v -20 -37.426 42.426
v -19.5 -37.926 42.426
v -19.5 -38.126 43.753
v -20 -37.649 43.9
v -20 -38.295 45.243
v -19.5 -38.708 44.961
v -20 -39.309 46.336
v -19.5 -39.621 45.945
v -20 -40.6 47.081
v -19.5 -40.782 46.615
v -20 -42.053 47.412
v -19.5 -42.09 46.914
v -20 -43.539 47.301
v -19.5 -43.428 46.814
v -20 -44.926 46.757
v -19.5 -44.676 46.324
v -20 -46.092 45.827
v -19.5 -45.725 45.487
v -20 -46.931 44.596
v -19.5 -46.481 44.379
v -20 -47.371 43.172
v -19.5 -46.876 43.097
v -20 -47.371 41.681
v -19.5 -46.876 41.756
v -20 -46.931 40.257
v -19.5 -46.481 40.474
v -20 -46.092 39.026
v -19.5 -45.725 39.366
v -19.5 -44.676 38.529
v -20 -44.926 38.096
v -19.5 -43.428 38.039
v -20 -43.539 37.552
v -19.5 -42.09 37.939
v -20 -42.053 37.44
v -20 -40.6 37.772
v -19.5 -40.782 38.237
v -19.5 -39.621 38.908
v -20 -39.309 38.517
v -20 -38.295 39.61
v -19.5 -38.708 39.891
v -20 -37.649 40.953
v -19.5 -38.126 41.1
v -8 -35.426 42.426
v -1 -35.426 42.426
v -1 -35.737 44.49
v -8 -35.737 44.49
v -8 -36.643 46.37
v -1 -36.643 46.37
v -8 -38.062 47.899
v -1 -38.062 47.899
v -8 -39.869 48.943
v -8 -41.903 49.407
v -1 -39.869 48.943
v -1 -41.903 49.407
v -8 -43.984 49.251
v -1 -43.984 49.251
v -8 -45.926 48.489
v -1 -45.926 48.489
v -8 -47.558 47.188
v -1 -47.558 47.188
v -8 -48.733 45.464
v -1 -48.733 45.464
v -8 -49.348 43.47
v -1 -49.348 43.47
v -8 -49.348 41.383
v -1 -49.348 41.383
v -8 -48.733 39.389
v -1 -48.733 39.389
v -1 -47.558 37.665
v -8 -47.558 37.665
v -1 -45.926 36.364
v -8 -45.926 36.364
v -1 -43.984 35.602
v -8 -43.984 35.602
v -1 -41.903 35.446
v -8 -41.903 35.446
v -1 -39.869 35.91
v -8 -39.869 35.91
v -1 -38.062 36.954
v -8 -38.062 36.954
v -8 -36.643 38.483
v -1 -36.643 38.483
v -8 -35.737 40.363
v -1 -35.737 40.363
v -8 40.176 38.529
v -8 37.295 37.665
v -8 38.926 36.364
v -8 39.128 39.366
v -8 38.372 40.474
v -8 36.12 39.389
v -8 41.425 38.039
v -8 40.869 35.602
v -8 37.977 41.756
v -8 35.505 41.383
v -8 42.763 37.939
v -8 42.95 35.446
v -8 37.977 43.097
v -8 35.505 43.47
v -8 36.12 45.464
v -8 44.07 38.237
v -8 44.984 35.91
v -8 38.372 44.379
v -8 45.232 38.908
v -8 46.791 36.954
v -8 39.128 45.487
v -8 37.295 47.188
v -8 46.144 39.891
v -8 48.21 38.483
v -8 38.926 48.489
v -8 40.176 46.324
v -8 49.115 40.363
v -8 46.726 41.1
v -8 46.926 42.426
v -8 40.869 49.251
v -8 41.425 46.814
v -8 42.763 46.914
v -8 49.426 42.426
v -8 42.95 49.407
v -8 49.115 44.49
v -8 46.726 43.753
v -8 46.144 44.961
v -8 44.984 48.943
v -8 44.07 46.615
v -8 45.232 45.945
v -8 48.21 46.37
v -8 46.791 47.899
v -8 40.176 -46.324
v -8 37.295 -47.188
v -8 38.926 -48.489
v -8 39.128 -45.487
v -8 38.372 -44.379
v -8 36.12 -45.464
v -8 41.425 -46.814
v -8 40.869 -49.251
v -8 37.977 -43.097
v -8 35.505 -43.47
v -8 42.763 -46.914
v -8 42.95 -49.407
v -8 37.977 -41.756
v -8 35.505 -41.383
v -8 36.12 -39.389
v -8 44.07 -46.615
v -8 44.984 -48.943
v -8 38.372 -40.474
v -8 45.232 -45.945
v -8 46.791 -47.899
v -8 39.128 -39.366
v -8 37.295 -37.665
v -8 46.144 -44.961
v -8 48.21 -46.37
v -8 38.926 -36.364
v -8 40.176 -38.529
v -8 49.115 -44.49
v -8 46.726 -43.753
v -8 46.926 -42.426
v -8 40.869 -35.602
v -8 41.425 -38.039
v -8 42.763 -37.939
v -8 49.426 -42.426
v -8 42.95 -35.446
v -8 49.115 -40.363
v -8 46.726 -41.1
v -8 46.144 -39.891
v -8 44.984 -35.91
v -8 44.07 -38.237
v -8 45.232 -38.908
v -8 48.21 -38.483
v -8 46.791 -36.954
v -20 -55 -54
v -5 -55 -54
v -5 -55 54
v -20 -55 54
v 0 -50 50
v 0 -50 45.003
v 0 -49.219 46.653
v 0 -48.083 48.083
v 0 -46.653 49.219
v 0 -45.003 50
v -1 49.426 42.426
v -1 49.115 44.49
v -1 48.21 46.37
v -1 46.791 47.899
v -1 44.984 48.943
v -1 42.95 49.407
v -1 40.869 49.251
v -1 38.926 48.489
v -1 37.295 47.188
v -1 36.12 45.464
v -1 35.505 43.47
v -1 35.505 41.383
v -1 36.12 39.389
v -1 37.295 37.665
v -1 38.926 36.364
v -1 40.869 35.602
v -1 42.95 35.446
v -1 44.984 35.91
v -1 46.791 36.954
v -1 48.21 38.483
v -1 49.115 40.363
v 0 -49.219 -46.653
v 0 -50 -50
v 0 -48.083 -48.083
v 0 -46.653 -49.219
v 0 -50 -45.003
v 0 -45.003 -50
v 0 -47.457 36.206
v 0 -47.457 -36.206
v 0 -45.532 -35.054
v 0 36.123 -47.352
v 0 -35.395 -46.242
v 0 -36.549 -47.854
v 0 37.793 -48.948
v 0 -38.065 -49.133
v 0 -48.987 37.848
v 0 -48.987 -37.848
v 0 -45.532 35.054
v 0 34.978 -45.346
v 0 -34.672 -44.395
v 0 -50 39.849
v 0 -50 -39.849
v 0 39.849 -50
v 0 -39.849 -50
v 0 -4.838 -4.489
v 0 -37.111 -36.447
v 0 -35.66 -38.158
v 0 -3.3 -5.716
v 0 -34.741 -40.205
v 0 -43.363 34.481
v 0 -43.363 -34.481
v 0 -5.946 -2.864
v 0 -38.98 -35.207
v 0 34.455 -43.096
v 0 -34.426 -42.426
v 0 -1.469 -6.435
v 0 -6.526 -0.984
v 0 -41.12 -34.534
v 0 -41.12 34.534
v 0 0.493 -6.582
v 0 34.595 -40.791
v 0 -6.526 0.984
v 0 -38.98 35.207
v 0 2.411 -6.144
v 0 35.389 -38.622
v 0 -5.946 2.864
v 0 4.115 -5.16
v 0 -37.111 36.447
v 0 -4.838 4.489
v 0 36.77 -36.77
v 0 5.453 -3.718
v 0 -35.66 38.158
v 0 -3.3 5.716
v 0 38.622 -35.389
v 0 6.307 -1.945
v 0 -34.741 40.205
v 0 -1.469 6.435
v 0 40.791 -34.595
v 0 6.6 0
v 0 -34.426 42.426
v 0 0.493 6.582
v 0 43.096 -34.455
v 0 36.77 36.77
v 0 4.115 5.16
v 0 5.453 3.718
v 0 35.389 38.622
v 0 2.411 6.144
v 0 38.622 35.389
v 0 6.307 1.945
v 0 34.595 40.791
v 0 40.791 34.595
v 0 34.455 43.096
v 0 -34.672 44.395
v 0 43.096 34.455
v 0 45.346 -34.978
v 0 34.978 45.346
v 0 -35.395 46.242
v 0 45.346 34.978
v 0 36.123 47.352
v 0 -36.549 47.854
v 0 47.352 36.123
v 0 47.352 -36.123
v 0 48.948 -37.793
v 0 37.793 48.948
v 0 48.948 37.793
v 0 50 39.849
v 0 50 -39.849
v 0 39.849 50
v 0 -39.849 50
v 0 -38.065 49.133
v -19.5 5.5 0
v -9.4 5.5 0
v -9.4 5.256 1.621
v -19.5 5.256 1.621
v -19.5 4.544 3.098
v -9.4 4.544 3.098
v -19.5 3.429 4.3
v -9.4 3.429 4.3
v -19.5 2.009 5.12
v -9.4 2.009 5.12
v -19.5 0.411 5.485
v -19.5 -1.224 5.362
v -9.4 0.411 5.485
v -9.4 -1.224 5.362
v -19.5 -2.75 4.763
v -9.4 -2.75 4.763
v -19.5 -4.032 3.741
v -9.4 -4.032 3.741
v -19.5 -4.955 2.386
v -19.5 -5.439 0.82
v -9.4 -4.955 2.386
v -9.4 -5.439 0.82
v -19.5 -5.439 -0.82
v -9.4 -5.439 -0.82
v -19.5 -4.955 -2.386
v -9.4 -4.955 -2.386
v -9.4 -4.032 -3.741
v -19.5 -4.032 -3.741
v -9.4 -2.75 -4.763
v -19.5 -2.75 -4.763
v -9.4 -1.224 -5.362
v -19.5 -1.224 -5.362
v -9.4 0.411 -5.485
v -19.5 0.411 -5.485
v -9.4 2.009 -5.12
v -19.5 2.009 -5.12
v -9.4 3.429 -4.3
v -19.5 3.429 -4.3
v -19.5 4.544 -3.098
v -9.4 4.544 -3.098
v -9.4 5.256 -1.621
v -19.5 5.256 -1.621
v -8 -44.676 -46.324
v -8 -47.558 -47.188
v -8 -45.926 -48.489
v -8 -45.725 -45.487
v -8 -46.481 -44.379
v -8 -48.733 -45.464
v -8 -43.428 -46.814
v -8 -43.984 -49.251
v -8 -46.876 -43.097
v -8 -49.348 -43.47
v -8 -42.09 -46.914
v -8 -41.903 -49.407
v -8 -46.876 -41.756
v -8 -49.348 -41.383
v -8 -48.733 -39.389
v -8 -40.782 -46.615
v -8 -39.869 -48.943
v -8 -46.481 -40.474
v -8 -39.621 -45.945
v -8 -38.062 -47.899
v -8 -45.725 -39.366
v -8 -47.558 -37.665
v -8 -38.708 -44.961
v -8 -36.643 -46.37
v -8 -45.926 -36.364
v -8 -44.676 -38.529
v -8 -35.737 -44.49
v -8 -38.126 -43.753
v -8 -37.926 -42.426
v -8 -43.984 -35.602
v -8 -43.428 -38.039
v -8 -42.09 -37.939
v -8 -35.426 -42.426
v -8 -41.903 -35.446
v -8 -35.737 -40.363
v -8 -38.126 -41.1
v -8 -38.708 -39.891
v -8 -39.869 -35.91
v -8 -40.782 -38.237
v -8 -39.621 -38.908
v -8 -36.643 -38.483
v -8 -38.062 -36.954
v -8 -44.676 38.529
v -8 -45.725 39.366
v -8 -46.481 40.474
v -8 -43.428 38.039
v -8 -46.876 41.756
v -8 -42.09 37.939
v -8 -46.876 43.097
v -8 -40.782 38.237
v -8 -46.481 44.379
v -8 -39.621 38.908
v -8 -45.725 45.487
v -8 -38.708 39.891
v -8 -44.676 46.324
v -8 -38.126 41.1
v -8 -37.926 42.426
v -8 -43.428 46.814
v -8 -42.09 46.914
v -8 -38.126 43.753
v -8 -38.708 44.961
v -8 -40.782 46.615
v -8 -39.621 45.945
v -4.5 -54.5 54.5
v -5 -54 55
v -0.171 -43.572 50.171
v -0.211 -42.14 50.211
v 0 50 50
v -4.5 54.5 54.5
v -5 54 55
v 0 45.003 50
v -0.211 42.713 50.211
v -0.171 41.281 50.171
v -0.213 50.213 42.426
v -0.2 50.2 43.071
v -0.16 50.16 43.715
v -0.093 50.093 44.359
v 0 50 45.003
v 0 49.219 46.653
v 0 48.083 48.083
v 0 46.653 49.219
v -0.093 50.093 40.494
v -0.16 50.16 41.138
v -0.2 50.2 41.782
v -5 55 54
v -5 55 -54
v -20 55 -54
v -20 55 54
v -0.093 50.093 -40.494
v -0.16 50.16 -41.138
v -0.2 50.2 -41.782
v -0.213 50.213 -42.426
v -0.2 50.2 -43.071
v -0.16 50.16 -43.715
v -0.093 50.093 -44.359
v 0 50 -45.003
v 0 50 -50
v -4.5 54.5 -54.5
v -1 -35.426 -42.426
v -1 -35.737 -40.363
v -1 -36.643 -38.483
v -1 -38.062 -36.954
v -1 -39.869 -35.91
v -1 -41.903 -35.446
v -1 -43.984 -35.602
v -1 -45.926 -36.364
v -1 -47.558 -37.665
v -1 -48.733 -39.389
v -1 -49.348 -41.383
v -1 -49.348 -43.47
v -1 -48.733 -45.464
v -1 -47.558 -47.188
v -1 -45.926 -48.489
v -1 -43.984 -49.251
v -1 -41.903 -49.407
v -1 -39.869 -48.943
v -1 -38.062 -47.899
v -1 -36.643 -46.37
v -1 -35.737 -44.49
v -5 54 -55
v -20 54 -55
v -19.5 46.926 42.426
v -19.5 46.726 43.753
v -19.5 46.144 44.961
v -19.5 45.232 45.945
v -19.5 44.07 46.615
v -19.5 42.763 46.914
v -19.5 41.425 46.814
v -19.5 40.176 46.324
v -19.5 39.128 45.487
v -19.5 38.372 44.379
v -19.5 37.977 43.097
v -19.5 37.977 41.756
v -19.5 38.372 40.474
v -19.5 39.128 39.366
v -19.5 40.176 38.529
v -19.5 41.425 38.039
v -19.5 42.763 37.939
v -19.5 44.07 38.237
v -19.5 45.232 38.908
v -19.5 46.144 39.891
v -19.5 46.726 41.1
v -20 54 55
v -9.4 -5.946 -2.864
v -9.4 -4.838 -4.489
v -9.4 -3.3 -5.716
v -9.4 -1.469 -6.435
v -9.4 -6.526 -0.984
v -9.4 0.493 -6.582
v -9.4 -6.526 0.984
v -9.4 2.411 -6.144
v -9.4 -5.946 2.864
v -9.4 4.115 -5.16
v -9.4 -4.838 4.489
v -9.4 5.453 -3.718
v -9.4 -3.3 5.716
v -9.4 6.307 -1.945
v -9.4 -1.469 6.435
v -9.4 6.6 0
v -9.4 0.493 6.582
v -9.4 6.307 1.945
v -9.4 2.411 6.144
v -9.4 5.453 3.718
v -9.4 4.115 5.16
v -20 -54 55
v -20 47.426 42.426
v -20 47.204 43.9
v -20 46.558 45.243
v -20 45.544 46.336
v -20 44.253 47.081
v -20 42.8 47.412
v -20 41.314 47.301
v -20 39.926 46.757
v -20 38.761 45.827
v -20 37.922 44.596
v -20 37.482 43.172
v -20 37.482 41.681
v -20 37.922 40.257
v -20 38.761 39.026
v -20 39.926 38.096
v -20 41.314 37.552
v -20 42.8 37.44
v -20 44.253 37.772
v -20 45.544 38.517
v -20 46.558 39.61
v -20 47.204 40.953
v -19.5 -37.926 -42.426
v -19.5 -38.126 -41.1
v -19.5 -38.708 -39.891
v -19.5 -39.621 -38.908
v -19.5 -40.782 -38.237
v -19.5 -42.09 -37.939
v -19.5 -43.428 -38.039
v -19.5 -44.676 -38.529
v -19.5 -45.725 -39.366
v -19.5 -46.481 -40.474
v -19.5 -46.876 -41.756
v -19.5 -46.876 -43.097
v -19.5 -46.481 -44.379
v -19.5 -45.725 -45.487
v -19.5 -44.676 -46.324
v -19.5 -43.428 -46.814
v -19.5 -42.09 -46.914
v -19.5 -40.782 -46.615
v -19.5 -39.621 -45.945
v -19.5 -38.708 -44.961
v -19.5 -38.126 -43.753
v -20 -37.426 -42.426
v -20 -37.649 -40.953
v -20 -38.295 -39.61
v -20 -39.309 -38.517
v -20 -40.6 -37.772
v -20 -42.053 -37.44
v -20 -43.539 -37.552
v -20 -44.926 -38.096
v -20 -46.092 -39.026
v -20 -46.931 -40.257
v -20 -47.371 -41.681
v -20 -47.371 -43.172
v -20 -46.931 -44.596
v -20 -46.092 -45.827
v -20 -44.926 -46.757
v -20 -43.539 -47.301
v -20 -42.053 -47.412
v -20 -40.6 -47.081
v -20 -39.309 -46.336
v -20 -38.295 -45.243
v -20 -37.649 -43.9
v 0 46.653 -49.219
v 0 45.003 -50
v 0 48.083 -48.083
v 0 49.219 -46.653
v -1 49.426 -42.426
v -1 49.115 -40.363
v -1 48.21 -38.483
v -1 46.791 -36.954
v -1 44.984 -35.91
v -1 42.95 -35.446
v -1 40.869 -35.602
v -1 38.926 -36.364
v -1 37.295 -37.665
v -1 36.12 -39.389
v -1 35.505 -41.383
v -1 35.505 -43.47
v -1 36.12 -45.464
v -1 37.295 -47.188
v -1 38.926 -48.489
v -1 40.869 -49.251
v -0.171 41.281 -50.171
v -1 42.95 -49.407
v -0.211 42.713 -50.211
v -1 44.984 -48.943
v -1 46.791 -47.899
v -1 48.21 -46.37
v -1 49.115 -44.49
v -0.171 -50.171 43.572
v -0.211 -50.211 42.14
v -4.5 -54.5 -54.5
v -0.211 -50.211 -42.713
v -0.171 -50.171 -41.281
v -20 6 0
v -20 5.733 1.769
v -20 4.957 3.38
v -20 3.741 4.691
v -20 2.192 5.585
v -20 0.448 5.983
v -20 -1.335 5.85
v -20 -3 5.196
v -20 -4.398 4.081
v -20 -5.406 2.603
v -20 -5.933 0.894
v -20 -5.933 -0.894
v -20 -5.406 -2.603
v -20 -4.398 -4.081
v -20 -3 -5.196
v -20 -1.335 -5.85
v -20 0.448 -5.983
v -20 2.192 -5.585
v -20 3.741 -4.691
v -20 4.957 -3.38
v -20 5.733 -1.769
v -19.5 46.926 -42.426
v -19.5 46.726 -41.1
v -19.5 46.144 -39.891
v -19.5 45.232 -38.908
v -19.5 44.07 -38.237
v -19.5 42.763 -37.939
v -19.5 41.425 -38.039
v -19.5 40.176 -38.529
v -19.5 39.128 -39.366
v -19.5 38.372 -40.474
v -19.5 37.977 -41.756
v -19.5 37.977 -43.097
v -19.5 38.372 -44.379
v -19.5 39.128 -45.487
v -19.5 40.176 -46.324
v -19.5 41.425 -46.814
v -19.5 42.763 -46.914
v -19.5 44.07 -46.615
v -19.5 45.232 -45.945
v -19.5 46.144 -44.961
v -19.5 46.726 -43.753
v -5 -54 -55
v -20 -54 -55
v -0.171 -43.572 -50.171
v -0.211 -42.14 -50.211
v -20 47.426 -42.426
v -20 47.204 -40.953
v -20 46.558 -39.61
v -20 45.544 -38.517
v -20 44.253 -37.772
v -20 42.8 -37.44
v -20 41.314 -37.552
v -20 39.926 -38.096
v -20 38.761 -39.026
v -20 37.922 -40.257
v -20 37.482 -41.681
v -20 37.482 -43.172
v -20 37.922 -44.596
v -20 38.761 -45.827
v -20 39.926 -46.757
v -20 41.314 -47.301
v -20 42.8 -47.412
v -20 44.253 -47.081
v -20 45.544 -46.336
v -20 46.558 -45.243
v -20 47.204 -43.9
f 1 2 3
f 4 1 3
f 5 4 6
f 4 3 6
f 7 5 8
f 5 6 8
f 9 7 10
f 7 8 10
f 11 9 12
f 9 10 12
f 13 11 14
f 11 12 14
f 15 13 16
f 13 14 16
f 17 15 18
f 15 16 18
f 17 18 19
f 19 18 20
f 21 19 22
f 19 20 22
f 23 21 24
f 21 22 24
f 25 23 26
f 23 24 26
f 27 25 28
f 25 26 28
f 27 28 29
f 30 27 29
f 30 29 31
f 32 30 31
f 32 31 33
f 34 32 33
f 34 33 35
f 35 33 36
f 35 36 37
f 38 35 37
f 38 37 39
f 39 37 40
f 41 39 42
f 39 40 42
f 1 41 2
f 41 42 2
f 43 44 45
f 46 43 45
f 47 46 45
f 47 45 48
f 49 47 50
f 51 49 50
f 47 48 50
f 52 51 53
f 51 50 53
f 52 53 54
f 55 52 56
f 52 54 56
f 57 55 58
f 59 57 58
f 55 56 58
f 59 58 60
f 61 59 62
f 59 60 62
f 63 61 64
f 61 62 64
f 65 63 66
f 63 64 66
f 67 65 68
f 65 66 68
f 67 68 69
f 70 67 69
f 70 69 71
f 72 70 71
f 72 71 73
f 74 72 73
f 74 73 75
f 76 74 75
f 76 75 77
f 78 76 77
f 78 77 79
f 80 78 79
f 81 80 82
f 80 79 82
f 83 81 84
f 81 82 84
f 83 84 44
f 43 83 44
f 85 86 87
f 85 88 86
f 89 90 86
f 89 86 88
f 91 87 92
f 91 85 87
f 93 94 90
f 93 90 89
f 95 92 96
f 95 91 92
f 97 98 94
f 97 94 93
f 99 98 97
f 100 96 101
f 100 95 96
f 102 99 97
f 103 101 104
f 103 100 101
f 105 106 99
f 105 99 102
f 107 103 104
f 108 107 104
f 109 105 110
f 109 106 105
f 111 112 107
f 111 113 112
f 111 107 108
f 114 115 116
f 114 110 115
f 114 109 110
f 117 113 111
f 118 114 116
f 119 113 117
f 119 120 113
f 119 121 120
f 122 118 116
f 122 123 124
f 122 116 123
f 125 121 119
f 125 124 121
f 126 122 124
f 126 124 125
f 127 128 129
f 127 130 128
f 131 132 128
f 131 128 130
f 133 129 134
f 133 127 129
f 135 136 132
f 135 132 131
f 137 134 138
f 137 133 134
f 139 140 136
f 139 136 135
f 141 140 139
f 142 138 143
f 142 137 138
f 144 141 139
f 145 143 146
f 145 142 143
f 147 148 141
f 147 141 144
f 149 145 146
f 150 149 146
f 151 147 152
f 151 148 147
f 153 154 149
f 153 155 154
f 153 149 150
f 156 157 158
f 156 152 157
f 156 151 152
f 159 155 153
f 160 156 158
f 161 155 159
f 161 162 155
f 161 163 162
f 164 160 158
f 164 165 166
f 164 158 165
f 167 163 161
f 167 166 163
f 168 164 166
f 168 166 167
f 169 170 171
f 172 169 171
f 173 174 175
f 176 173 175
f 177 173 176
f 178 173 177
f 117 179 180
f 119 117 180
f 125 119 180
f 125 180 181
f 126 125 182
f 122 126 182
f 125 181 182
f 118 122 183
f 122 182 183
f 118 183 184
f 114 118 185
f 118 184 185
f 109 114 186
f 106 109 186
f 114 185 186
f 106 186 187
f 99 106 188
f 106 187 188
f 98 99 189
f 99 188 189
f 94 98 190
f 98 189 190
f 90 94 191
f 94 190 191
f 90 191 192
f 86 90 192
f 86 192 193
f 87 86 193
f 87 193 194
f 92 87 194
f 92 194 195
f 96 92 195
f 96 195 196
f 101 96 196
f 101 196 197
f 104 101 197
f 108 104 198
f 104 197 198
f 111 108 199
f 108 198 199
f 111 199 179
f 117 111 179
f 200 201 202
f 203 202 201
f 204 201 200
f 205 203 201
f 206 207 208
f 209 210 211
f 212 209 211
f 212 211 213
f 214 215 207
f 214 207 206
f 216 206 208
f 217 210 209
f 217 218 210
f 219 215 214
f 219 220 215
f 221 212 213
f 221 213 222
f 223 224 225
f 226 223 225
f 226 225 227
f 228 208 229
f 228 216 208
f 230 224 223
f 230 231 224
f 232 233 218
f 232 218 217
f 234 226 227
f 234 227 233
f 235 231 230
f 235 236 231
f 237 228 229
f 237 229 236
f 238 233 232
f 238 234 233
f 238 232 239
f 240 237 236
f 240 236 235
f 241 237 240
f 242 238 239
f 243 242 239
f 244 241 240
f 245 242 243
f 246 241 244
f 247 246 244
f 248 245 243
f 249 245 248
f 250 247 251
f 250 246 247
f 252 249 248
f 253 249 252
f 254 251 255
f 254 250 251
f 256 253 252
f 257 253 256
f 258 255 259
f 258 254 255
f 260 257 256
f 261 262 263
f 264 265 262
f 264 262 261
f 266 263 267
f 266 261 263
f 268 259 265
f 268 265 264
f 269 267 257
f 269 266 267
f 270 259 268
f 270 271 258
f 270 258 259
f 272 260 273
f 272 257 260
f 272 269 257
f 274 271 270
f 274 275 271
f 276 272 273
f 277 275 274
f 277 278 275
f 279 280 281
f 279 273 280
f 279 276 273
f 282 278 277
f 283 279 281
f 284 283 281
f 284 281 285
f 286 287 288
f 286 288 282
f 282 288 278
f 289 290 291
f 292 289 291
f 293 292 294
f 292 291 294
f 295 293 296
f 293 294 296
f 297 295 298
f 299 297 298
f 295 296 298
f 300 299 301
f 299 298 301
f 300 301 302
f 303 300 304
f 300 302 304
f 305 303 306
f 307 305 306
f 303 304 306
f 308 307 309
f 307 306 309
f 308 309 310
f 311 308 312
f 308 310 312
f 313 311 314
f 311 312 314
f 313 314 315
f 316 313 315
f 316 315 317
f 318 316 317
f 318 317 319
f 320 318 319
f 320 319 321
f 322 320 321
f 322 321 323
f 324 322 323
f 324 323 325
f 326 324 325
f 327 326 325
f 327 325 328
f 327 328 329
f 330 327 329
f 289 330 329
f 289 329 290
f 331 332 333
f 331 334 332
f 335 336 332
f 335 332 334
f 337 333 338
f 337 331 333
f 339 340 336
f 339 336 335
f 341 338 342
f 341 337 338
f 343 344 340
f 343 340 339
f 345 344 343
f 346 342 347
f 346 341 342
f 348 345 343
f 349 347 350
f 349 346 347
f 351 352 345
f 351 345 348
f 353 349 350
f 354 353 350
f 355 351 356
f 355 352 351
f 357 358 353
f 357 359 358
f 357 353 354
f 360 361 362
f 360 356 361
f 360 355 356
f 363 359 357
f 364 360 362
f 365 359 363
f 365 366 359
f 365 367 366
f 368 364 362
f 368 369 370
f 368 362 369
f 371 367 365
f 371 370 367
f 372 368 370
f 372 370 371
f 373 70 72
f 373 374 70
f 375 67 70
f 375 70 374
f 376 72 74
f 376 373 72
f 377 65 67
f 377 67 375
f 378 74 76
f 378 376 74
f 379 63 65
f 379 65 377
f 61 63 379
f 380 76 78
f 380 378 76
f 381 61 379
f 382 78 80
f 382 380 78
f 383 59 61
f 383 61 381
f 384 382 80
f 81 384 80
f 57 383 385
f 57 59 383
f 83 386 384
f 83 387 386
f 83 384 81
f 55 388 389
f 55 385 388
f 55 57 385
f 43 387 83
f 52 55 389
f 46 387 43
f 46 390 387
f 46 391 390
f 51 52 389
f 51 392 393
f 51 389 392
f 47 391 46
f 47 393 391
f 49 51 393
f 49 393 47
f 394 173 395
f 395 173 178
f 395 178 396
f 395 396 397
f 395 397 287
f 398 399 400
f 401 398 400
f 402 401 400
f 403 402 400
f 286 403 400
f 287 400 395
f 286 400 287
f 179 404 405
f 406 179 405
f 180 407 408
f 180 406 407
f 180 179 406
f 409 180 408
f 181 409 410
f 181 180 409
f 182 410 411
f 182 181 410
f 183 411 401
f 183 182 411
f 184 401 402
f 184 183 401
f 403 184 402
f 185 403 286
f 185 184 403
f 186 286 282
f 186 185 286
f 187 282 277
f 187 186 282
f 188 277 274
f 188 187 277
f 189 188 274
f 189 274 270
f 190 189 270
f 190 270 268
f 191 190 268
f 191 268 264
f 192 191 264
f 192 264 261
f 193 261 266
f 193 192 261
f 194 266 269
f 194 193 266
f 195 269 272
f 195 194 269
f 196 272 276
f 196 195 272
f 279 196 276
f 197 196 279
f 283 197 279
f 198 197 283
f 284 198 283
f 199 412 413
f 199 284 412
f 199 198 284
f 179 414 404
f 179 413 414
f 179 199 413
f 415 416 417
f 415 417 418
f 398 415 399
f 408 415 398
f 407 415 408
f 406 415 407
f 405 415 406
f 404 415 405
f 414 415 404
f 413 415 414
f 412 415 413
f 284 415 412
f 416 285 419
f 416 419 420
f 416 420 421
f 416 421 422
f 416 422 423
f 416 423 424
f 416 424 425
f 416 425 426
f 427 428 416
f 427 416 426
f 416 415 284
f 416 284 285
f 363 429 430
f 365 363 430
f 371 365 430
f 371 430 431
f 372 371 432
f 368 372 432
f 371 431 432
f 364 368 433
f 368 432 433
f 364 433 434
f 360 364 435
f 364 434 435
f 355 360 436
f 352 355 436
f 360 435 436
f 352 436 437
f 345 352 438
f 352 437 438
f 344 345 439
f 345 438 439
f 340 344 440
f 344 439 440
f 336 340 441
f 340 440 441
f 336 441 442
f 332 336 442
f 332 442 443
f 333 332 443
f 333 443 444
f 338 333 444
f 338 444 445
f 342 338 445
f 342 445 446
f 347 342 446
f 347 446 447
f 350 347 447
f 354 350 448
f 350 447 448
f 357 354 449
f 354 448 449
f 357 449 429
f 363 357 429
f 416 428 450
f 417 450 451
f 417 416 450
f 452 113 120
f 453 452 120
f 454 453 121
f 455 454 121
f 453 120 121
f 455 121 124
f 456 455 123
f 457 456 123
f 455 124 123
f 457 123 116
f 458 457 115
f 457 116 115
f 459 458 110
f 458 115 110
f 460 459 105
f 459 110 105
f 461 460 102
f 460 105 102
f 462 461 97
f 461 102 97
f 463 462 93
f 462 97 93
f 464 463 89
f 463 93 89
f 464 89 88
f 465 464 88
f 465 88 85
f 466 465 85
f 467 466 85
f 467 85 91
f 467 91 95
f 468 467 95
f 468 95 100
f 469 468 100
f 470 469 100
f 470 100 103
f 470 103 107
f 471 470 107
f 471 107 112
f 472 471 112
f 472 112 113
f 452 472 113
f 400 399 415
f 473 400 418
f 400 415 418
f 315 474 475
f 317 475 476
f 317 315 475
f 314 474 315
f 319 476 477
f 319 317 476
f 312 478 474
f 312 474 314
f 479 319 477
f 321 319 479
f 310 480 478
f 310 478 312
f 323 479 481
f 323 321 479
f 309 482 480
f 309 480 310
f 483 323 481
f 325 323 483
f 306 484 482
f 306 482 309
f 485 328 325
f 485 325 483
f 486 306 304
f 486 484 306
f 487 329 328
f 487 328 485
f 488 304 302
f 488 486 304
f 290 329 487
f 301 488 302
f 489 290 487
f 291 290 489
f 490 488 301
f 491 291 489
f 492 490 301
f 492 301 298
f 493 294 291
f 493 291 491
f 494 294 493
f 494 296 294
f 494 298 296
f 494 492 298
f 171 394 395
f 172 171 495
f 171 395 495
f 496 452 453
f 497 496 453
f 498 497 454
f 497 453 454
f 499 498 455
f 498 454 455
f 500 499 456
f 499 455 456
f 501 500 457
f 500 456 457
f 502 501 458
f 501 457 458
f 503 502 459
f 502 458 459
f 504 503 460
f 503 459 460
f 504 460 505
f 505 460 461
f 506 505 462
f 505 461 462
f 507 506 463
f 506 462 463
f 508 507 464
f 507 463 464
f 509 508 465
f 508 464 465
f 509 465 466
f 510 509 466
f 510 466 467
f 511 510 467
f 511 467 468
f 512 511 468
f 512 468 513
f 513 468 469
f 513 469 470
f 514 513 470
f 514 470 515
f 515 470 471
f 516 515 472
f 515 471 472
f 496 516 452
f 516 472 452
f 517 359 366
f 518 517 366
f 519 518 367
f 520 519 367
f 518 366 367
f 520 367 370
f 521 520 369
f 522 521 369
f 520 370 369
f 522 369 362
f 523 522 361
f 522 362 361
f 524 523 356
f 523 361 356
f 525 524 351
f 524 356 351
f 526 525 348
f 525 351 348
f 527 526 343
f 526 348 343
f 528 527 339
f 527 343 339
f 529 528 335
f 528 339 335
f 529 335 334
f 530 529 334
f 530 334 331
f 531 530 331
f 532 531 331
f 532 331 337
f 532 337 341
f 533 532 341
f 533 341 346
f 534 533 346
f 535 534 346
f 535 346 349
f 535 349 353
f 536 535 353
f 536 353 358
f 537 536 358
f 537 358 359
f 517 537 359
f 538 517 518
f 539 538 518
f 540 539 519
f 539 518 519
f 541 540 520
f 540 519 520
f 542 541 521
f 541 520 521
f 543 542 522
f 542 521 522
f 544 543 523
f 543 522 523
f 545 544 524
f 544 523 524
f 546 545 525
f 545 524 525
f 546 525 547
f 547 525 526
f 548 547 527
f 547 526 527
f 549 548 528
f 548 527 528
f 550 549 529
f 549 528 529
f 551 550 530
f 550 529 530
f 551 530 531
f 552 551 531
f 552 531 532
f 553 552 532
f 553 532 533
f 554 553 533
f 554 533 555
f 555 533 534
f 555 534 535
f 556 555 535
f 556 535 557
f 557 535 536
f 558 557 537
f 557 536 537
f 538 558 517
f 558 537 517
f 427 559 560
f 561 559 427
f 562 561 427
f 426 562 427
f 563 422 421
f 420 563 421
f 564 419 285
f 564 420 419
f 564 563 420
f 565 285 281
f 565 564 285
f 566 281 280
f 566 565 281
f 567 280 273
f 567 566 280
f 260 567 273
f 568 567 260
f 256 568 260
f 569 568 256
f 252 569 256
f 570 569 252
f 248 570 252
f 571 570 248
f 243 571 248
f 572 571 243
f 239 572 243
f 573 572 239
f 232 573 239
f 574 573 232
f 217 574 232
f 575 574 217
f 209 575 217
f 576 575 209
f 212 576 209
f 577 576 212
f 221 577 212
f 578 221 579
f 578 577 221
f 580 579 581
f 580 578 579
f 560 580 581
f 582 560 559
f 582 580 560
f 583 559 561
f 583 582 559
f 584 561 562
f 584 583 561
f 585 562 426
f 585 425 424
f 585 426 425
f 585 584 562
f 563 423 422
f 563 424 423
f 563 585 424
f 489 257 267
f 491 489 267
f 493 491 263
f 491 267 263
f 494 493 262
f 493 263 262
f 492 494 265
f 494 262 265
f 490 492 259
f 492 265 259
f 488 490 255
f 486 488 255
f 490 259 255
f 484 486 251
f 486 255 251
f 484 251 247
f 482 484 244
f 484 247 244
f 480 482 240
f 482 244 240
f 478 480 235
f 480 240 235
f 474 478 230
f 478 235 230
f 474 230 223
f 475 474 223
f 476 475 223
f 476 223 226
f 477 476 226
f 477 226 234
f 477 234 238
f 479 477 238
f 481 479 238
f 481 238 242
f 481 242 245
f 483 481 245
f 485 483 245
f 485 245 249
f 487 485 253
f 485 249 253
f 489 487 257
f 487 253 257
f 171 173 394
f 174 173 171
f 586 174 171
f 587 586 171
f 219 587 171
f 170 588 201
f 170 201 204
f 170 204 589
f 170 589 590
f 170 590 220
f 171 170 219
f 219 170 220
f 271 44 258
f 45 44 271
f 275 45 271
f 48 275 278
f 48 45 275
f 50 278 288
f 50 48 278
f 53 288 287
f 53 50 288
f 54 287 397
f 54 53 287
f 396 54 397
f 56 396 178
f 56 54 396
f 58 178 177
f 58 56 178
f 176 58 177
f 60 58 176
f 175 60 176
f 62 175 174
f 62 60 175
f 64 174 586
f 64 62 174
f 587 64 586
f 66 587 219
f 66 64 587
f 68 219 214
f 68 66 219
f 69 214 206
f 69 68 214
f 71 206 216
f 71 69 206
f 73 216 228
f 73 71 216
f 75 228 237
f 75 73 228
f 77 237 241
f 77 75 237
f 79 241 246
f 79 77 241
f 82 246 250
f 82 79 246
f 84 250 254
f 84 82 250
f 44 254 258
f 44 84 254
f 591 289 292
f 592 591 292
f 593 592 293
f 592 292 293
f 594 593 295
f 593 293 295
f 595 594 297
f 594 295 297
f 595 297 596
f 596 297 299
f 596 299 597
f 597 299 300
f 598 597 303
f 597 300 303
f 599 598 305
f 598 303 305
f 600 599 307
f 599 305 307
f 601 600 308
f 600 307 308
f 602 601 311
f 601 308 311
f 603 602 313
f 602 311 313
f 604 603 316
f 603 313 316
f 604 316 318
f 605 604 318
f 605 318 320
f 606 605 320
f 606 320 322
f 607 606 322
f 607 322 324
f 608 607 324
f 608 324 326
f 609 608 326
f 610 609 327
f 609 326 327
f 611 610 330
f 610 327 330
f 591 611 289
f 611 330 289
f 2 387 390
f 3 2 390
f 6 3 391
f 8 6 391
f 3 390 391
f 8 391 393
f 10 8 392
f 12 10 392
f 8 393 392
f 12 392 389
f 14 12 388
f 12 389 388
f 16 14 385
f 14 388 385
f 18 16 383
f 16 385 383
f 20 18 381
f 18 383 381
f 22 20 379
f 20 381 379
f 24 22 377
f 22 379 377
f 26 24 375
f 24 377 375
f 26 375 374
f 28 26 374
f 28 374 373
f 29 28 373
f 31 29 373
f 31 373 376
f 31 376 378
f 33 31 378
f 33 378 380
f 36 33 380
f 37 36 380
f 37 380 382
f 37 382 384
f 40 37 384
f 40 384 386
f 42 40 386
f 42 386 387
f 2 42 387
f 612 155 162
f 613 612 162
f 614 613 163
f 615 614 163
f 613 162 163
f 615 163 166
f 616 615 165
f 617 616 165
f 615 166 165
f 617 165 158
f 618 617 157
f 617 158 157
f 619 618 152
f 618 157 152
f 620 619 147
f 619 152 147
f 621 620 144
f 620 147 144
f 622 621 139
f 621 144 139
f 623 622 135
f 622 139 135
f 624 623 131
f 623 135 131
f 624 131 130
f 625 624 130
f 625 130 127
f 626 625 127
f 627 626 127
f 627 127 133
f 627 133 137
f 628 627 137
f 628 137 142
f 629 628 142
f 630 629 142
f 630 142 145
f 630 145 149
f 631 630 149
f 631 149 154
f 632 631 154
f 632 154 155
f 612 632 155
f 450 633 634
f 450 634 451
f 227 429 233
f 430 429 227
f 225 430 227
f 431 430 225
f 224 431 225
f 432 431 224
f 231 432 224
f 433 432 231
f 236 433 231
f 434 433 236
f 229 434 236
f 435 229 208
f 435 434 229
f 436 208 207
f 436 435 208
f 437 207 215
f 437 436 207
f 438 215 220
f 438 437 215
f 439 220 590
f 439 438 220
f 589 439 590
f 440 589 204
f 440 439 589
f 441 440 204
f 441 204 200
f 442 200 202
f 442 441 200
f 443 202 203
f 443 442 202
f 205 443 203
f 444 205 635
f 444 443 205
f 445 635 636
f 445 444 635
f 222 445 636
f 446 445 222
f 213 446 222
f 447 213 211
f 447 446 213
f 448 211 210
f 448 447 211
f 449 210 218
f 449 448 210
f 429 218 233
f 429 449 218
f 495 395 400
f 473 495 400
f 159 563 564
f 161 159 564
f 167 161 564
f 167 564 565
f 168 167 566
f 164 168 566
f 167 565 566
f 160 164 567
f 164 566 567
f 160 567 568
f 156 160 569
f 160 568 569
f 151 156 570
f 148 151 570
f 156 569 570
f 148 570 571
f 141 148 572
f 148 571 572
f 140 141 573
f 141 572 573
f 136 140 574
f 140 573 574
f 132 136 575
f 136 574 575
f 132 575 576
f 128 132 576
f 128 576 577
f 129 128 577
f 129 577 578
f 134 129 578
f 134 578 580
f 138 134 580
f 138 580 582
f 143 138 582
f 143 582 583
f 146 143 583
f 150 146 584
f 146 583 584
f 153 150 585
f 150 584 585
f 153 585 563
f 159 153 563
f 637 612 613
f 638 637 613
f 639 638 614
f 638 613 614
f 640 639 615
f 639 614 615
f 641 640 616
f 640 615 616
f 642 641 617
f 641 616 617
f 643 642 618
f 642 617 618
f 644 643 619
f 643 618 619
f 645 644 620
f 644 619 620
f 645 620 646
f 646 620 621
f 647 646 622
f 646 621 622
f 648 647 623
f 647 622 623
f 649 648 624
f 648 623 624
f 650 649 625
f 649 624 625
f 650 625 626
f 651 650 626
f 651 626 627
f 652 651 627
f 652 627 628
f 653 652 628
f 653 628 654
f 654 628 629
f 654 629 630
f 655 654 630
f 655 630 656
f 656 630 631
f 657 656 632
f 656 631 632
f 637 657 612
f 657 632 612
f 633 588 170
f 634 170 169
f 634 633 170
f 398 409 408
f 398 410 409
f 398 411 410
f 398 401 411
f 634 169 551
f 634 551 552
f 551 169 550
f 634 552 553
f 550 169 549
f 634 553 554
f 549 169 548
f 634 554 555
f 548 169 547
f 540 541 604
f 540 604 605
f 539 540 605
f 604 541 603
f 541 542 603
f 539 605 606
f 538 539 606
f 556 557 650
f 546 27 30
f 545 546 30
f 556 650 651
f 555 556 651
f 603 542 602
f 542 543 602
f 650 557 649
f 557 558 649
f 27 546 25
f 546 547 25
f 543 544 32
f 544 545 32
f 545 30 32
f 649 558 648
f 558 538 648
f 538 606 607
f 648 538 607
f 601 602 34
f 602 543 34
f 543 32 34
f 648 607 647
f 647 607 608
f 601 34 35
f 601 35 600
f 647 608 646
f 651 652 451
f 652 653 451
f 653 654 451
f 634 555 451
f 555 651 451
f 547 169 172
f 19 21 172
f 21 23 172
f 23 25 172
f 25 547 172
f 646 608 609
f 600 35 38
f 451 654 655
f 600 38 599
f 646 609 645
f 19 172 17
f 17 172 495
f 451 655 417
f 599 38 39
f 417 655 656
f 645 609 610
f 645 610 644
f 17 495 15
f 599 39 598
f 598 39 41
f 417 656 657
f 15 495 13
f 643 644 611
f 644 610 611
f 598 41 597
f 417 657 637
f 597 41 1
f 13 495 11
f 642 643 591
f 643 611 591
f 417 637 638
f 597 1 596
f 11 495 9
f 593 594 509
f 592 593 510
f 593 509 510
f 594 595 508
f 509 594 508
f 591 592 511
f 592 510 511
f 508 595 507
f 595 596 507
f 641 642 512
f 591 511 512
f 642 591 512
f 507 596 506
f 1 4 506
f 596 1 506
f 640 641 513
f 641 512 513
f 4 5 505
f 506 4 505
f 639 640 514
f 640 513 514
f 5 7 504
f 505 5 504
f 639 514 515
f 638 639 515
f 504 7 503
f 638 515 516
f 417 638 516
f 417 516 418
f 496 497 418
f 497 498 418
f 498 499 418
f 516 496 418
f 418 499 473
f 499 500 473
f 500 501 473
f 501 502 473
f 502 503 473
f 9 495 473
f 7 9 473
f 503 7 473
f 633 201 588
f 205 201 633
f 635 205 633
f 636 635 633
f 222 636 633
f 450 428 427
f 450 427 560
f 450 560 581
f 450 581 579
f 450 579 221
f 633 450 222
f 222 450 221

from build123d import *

# Parameters (mm, degrees)
F0_W        = 110
F0_H        = 110
F0_R        = 7
F0_R_2      = 6.6
F0_R_3      = 4.5
F0_R_4      = 5.5
F1_DEPTH    = 20
F2_DEPTH    = 20.001
F3_DEPTH    = 8
F4_DEPTH    = 9.4
F5_SIZE     = 1
F6_T1_DEPTH = 133.7168298797
F6_T3_DEPTH = 133.7168298797
F7_SIZE     = 0.5


# Not quite as in the source:
# - a fillet or chamfer that OpenCascade refuses, or shapes differently, is made with other operations: its cross-section is extruded or revolved along the edge and cut away or added


with BuildPart() as f1:
    # F0 (on Right) → F1 (new body)
    with BuildSketch(Plane.YZ):
        Rectangle(F0_W, F0_H)
        with Locations((-42.4264068712, -42.4264068712)):
            Circle(F0_R, mode=Mode.SUBTRACT)
        with Locations((42.4264068712, -42.4264068712)):
            Circle(F0_R, mode=Mode.SUBTRACT)
        with Locations((-42.4264068712, 42.4264068712)):
            Circle(F0_R, mode=Mode.SUBTRACT)
        Circle(F0_R_2, mode=Mode.SUBTRACT)
        with Locations((42.4264068712, 42.4264068712)):
            Circle(F0_R, mode=Mode.SUBTRACT)
        with Locations((-42.4264068712, 42.4264068712)):
            Circle(F0_R)
        with Locations((-42.4264068712, 42.4264068712)):
            Circle(F0_R_3, mode=Mode.SUBTRACT)
        with Locations((-42.4264068712, -42.4264068712)):
            Circle(F0_R)
        with Locations((-42.4264068712, -42.4264068712)):
            Circle(F0_R_3, mode=Mode.SUBTRACT)
        with Locations((42.4264068712, -42.4264068712)):
            Circle(F0_R)
        with Locations((42.4264068712, -42.4264068712)):
            Circle(F0_R_3, mode=Mode.SUBTRACT)
        with Locations((42.4264068712, 42.4264068712)):
            Circle(F0_R)
        with Locations((42.4264068712, 42.4264068712)):
            Circle(F0_R_3, mode=Mode.SUBTRACT)
        Circle(F0_R_2)
        Circle(F0_R_4, mode=Mode.SUBTRACT)
        Circle(F0_R_4)
        with Locations((-42.4264068712, 42.4264068712)):
            Circle(F0_R_3)
        with Locations((-42.4264068712, -42.4264068712)):
            Circle(F0_R_3)
        with Locations((42.4264068712, -42.4264068712)):
            Circle(F0_R_3)
        with Locations((42.4264068712, 42.4264068712)):
            Circle(F0_R_3)
    extrude(amount=-F1_DEPTH)

    # F0 (on Right) → F2 (cut, through all)
    with BuildSketch(Plane.YZ):
        with Locations((-42.4264068712, 42.4264068712)):
            Circle(F0_R_3)
        with Locations((42.4264068712, -42.4264068712)):
            Circle(F0_R_3)
        with Locations((-42.4264068712, -42.4264068712)):
            Circle(F0_R_3)
        Circle(F0_R_4)
        with Locations((42.4264068712, 42.4264068712)):
            Circle(F0_R_3)
    extrude(amount=-F2_DEPTH, mode=Mode.SUBTRACT)

    # F0 (on Right) → F3 (cut)
    with BuildSketch(Plane.YZ):
        with Locations((-42.4264068712, 42.4264068712)):
            Circle(F0_R)
        with Locations((-42.4264068712, 42.4264068712)):
            Circle(F0_R_3, mode=Mode.SUBTRACT)
        with Locations((42.4264068712, 42.4264068712)):
            Circle(F0_R)
        with Locations((42.4264068712, 42.4264068712)):
            Circle(F0_R_3, mode=Mode.SUBTRACT)
        with Locations((-42.4264068712, -42.4264068712)):
            Circle(F0_R)
        with Locations((-42.4264068712, -42.4264068712)):
            Circle(F0_R_3, mode=Mode.SUBTRACT)
        with Locations((42.4264068712, -42.4264068712)):
            Circle(F0_R)
        with Locations((42.4264068712, -42.4264068712)):
            Circle(F0_R_3, mode=Mode.SUBTRACT)
    extrude(amount=-F3_DEPTH, mode=Mode.SUBTRACT)

    # F0 (on Right) → F4 (cut)
    with BuildSketch(Plane.YZ):
        Circle(F0_R_2)
        Circle(F0_R_4, mode=Mode.SUBTRACT)
    extrude(amount=-F4_DEPTH, mode=Mode.SUBTRACT)

    # F5
    f5_edges = [f1.edges().sort_by_distance(p)[0] for p in [
        (0, -49.426407, 42.426407),
        (0, 35.426407, 42.426407),
        (0, -49.426407, -42.426407),
        (0, 35.426407, -42.426407),
        (-10, 55, -55),
        (-10, 55, 55),
        (-10, -55, 55),
        (-10, -55, -55),
    ]]
    chamfer(f5_edges, length=F5_SIZE)

    # F6: chamfer of 5 on 4 edges, made by hand

    # F6_s2 → F6_t1 (cut)
    with BuildSketch(Plane.XY.offset(-66.8584149398)):
        Polygon((0, -50), (-5, -55), (0, -55), align=None)
        Polygon((-5, 55), (0, 50), (0, 55), align=None)
    extrude(amount=F6_T1_DEPTH, mode=Mode.SUBTRACT)

    # F6_s4 → F6_t3 (cut)
    with BuildSketch(Plane.XZ.offset(-66.8584149398)):
        Polygon((0, 50), (-5, 55), (0, 55), align=None)
        Polygon((0, -50), (-5, -55), (0, -55), align=None)
    extrude(amount=F6_T3_DEPTH, mode=Mode.SUBTRACT)

    # F7
    f7_edges = [f1.edges().sort_by_distance(p)[0] for p in [
        (-20, 37.926407, -42.426407),
        (-20, 37.926407, 42.426407),
        (-20, -46.926407, 42.426407),
        (-20, -46.926407, -42.426407),
        (-20, -5.5, 0),
    ]]
    chamfer(f7_edges, length=F7_SIZE)


solid = f1.part
